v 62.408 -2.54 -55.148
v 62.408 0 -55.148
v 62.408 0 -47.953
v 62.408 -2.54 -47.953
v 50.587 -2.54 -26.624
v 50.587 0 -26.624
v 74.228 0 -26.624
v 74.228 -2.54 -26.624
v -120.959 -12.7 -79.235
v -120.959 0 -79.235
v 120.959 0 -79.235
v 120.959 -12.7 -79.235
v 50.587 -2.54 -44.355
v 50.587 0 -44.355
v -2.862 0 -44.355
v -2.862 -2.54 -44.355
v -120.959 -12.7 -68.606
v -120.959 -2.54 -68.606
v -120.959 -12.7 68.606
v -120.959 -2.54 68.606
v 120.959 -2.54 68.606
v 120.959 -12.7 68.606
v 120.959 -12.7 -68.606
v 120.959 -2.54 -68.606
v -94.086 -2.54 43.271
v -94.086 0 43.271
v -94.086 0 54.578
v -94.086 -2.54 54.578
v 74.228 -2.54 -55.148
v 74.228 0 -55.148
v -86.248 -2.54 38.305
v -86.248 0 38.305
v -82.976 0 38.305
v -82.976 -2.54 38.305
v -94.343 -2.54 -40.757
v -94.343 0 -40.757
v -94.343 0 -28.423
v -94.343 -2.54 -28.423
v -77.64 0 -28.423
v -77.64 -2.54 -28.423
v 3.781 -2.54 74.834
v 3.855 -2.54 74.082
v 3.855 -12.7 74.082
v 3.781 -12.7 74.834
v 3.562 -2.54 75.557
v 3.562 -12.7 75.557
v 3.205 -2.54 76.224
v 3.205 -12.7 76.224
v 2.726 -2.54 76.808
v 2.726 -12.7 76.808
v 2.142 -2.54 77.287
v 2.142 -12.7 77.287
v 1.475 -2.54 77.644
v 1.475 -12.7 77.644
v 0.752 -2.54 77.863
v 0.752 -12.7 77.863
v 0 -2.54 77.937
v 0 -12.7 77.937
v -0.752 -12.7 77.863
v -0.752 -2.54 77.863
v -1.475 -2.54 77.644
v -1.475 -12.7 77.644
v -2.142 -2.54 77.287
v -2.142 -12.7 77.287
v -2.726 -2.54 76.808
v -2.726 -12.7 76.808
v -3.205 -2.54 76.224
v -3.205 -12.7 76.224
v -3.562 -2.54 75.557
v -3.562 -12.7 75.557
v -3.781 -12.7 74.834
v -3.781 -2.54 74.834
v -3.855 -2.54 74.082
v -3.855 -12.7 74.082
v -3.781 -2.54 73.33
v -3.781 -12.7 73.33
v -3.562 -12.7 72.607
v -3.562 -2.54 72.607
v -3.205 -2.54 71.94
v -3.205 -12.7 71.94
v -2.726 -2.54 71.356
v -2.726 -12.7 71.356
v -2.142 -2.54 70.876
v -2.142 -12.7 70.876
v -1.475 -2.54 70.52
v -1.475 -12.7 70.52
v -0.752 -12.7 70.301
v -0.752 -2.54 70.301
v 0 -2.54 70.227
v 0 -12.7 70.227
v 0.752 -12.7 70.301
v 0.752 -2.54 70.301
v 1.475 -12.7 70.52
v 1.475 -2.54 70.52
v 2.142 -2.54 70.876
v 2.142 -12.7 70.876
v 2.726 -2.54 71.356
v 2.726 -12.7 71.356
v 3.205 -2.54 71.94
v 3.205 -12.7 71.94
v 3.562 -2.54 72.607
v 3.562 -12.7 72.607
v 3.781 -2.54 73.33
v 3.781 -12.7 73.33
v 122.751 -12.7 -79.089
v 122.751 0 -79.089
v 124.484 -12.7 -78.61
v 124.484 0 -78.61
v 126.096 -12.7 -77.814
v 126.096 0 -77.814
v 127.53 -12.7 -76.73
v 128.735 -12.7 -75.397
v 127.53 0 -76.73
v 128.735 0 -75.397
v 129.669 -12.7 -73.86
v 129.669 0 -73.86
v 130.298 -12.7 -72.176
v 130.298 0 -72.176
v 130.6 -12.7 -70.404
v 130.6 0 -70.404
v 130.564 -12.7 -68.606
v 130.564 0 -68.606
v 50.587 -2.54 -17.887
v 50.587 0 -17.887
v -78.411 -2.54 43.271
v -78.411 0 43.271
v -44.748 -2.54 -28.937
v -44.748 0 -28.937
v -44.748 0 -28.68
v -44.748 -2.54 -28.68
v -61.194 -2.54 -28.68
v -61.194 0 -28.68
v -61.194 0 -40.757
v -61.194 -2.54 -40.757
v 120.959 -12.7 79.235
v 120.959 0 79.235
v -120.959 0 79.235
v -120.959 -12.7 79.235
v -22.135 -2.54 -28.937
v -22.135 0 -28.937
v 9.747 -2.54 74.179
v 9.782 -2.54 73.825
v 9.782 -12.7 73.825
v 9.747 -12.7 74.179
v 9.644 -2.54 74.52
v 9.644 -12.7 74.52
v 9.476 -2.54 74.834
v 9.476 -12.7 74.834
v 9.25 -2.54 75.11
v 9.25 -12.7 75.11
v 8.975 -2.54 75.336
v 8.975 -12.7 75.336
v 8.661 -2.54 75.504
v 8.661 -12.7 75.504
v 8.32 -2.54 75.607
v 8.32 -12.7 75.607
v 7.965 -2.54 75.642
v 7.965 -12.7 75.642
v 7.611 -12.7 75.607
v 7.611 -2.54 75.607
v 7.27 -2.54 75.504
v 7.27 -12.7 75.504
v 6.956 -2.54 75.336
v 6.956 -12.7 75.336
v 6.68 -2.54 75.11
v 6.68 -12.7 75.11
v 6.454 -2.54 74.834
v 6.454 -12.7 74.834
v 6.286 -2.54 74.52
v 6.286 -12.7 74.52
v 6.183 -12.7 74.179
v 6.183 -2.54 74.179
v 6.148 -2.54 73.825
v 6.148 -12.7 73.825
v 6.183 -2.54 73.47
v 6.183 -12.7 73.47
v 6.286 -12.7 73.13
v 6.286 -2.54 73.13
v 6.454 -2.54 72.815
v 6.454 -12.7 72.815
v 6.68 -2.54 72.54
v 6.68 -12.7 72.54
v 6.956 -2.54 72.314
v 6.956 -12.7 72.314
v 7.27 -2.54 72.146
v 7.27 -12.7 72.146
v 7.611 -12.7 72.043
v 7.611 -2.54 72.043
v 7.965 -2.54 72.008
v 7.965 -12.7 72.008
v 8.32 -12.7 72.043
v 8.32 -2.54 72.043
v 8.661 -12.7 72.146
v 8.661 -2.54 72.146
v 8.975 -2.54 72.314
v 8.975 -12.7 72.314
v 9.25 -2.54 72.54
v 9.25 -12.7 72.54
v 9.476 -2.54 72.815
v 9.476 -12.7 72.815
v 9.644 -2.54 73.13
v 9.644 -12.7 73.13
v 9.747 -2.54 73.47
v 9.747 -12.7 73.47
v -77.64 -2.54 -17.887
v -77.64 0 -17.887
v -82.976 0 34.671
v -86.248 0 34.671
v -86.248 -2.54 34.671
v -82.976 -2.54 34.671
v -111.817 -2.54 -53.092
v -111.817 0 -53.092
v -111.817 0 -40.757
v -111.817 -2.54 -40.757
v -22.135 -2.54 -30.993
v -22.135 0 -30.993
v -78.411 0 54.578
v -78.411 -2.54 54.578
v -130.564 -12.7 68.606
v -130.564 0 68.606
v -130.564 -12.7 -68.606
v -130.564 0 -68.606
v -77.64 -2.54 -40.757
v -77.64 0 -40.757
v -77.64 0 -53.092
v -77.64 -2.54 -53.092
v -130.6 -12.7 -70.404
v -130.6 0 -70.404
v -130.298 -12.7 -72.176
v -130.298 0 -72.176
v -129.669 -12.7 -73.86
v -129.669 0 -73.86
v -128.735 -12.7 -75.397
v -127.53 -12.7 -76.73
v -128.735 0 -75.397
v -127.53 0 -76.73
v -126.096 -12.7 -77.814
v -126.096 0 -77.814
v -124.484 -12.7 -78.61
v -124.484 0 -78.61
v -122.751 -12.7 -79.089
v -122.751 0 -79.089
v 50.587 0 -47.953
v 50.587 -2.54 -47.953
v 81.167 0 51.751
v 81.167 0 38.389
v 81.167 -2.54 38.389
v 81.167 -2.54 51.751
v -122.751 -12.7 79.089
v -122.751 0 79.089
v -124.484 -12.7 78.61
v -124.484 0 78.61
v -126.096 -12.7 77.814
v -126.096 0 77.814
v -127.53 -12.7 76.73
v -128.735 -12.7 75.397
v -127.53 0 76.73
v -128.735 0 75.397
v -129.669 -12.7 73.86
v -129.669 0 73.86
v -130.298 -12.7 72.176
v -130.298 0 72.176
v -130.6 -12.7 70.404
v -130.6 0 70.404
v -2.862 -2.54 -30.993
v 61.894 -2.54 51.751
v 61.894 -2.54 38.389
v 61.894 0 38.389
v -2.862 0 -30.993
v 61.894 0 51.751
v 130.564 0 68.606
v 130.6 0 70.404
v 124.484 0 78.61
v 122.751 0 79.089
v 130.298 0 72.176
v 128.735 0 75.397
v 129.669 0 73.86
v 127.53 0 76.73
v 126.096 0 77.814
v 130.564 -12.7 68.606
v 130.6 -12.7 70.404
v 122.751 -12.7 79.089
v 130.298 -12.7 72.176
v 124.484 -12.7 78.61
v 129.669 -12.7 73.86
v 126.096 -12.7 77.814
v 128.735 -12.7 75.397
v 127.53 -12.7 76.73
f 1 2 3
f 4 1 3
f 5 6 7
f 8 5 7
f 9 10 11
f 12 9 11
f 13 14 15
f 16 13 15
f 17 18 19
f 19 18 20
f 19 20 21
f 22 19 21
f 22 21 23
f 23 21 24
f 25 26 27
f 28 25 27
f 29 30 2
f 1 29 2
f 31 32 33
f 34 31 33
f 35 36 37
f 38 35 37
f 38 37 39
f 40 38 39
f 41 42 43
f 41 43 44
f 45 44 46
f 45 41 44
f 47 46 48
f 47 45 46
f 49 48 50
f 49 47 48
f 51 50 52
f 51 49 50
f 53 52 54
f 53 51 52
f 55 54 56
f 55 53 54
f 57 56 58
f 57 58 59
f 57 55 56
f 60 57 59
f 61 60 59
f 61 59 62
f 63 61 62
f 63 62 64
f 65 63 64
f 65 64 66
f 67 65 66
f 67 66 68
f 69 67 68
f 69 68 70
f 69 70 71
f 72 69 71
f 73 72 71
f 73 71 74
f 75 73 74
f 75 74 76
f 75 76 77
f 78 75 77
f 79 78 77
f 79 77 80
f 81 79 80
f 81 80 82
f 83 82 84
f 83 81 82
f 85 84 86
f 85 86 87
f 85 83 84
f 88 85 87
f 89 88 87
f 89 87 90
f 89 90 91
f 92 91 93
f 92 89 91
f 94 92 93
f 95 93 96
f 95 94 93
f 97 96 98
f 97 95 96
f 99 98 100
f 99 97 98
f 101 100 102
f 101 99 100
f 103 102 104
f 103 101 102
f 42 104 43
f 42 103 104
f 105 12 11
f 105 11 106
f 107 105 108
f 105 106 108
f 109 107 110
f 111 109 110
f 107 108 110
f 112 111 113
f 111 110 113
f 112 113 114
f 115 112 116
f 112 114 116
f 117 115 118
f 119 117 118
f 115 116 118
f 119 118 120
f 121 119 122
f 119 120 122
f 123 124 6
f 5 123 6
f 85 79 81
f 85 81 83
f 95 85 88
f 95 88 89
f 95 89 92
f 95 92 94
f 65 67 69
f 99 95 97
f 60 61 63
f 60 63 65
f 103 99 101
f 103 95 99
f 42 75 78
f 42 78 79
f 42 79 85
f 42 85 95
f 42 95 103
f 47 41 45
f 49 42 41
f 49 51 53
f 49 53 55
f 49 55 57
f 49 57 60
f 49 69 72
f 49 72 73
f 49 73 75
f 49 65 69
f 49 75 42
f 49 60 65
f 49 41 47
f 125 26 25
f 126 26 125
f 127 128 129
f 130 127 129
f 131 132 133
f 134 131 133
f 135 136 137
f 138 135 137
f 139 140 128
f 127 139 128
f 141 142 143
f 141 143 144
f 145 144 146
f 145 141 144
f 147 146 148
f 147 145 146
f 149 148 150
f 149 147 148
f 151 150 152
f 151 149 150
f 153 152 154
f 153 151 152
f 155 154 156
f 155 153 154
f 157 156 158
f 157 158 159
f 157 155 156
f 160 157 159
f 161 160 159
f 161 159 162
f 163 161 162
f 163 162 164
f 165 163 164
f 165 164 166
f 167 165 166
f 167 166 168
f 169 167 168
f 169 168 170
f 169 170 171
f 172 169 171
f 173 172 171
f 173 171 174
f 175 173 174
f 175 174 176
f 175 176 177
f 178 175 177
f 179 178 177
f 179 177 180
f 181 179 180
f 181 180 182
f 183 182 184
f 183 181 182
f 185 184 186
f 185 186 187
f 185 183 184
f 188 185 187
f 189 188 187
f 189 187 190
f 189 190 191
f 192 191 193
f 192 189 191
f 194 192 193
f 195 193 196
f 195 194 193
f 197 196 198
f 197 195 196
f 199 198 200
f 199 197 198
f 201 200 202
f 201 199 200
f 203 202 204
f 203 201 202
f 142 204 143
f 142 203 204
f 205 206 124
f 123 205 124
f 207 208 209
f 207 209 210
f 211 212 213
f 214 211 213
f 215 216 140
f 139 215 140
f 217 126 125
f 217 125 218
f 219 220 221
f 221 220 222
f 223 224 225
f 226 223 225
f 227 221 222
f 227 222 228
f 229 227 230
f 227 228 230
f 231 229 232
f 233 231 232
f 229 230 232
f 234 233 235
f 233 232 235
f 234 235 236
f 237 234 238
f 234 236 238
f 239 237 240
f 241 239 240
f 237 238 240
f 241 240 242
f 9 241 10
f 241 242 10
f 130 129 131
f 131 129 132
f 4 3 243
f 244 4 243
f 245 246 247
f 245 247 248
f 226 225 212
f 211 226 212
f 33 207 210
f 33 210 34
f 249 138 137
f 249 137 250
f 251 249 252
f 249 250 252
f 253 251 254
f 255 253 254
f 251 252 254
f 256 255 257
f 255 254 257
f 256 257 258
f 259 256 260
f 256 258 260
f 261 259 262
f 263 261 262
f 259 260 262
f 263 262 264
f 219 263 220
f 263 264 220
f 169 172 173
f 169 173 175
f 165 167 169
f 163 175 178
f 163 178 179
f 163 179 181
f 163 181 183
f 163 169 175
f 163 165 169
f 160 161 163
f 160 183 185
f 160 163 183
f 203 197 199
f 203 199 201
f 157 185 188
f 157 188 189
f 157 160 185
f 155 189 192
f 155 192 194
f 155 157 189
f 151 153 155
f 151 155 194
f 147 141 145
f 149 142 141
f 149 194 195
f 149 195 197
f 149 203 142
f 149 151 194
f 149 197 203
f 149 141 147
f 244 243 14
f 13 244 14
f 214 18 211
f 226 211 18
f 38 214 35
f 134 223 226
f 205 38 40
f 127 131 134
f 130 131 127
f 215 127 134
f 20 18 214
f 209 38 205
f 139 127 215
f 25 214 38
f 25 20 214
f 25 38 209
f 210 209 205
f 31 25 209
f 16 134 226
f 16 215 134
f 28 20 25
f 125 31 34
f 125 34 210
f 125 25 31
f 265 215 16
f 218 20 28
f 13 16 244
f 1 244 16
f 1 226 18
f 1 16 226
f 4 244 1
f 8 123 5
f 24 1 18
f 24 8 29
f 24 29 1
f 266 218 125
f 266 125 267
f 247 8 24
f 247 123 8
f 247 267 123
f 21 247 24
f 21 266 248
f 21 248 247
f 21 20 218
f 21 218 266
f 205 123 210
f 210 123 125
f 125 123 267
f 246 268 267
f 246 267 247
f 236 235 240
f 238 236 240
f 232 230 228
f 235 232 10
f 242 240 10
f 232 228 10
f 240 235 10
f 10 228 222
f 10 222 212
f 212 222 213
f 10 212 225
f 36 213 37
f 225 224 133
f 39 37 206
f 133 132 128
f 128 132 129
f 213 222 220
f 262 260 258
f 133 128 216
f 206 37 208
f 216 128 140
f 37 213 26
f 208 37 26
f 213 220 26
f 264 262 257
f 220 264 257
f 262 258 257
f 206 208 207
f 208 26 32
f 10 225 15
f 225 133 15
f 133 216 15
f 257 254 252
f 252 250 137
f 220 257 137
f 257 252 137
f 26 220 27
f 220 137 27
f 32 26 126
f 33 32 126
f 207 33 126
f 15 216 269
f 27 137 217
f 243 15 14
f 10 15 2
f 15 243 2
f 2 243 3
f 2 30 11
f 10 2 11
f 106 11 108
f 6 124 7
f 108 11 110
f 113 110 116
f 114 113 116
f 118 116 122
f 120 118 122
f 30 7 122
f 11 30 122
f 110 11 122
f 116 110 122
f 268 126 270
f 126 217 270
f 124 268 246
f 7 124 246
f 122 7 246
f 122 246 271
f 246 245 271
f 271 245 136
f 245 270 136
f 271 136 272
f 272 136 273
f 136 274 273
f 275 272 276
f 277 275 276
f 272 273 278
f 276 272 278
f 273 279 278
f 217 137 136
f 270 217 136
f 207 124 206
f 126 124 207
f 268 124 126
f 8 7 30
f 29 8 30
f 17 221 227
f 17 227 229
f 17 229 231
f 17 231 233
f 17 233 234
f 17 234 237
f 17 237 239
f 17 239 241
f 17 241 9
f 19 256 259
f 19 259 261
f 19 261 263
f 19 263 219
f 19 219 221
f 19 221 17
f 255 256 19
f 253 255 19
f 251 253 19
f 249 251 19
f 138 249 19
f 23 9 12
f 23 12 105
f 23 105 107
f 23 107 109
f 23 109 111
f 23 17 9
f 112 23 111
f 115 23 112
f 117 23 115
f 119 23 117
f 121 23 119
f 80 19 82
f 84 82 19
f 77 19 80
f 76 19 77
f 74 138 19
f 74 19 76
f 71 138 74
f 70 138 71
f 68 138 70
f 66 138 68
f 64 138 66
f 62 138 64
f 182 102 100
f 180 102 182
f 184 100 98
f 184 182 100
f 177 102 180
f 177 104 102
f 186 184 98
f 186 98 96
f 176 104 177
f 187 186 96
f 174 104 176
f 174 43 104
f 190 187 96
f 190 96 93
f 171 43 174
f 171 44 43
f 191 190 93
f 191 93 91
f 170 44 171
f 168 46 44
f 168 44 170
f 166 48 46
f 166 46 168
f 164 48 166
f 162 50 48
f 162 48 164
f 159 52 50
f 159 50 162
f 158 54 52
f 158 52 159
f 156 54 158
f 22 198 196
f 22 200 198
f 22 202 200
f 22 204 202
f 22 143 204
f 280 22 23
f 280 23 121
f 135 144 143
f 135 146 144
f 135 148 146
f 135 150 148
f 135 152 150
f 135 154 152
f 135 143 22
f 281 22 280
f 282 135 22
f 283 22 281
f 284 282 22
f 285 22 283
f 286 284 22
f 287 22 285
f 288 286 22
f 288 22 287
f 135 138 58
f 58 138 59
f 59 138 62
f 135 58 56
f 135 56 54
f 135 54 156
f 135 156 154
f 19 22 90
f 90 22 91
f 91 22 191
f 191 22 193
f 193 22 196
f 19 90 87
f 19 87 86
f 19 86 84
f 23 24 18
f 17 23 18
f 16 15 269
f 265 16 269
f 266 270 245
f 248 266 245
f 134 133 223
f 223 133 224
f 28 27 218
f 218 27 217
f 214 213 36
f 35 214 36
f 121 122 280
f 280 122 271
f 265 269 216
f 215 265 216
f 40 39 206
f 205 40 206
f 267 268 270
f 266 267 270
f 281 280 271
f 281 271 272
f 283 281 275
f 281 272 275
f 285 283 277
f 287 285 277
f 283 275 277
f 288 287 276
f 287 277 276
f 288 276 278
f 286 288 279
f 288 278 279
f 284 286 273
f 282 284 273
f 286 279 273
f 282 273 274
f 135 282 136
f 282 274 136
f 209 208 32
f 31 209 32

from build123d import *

# Parameters (mm, degrees)
F0_R     = 3.8551712717
F0_R_2   = 1.8170405965
F1_DEPTH = 12.7
F0_W     = 120.9587007761
F0_H     = 68.6061382294
F0_W_2   = 3.2722949982
F0_H_2   = 3.6340802908
F0_W_3   = 15.6750679016
F0_H_3   = 11.3066062331
F0_W_4   = 19.2726254463
F0_H_4   = 13.362351805
F2_DEPTH = 2.54


with BuildPart() as f1:
    # F0 (on Front) → F1 (new body)
    with BuildSketch(Plane.XZ):
        with BuildLine():
            Line((-130.564019084, 68.6061382294), (-120.9587007761, 68.6061382294))
            Line((-120.9587007761, 68.6061382294), (-120.9587007761, 79.2347192764))
            ThreePointArc((-120.9587007761, 79.2347192764), (-128.1642263421, 76.0919600831), (-130.564019084, 68.6061382294))
        make_face()
        with BuildLine():
            Line((120.9587007761, 79.2347192764), (120.9587007761, 68.6061382294))
            Line((120.9587007761, 68.6061382294), (130.564019084, 68.6061382294))
            ThreePointArc((130.564019084, 68.6061382294), (128.1642263421, 76.0919600831), (120.9587007761, 79.2347192764))
        make_face()
        with BuildLine():
            Line((-120.9587007761, -79.2347192764), (-120.9587007761, -68.6061382294))
            Line((-120.9587007761, -68.6061382294), (-130.564019084, -68.6061382294))
            ThreePointArc((-130.564019084, -68.6061382294), (-128.1642263421, -76.0919600831), (-120.9587007761, -79.2347192764))
        make_face()
        with BuildLine():
            Line((130.564019084, -68.6061382294), (120.9587007761, -68.6061382294))
            Line((120.9587007761, -68.6061382294), (120.9587007761, -79.2347192764))
            ThreePointArc((120.9587007761, -79.2347192764), (128.1642263421, -76.0919600831), (130.564019084, -68.6061382294))
        make_face()
        Polygon((-120.9587007761, -68.6061382294), (-120.9587007761, 0), (-120.9587007761, 68.6061382294), (-130.564019084, 68.6061382294), (-130.564019084, -68.6061382294), align=None)
        Polygon((120.9587007761, 68.6061382294), (120.9587007761, 0), (120.9587007761, -68.6061382294), (130.564019084, -68.6061382294), (130.564019084, 68.6061382294), align=None)
        Polygon((0, -68.6061382294), (-120.9587007761, -68.6061382294), (-120.9587007761, -79.2347192764), (120.9587007761, -79.2347192764), (120.9587007761, -68.6061382294), align=None)
        Polygon((-120.9587007761, 68.6061382294), (0, 68.6061382294), (120.9587007761, 68.6061382294), (120.9587007761, 79.2347192764), (-120.9587007761, 79.2347192764), align=None)
        with Locations((0, 74.081890285)):
            Circle(F0_R, mode=Mode.SUBTRACT)
        with Locations((7.9652052373, 73.8249197602)):
            Circle(F0_R_2, mode=Mode.SUBTRACT)
    extrude(amount=F1_DEPTH)

    # F0 (on Front) → F2 (join)
    with BuildSketch(Plane.XZ):
        with Locations((-60.4793503881, 34.3030691147)):
            Rectangle(F0_W, F0_H)
        with Locations((-84.6121534705, 36.4879220724)):
            Rectangle(F0_W_2, F0_H_2, mode=Mode.SUBTRACT)
        with Locations((-86.2483009696, 48.9245094359)):
            Rectangle(F0_W_3, F0_H_3, mode=Mode.SUBTRACT)
        with Locations((60.4793503881, 34.3030691147)):
            Rectangle(F0_W, F0_H)
        with Locations((71.5301930904, 45.069983229)):
            Rectangle(F0_W_4, F0_H_4, mode=Mode.SUBTRACT)
        Polygon((120.9587007761, 0), (0, 0), (0, -17.8872328252), (23.6056204885, -17.8872328252), (50.5872815847, -17.8872328252), (50.5872815847, -26.6241524369), (74.228361249, -26.6241524369), (74.228361249, -47.9525141418), (74.228361249, -55.1476255059), (62.4078214169, -55.1476255059), (62.4078214169, -47.9525141418), (50.5872815847, -47.9525141418), (50.5872815847, -44.3549603224), (20.5219965428, -44.3549603224), (0, -44.3549603224), (0, -68.6061382294), (120.9587007761, -68.6061382294), align=None)
        Polygon((0, -17.8872328252), (0, 0), (-120.9587007761, 0), (-120.9587007761, -68.6061382294), (0, -68.6061382294), (0, -44.3549603224), (-2.8621072415, -44.3549603224), (-2.8621072415, -30.9926122427), (-22.1347268671, -30.9926122427), (-22.1347268671, -28.9368666708), (-44.7479300201, -28.9368666708), (-44.7479300201, -28.6798980087), (-61.1938983202, -28.6798980087), (-61.1938983202, -40.757406503), (-77.639862895, -40.757406503), (-77.639862895, -53.0918799341), (-94.3427979946, -53.0918799341), (-111.816637218, -53.0918799341), (-111.816637218, -40.757406503), (-94.3427979946, -40.757406503), (-94.3427979946, -28.4229293466), (-77.639862895, -28.4229293466), (-77.639862895, -17.8872328252), (-61.1938983202, -17.8872328252), (-44.7479300201, -17.8872328252), (-22.1347268671, -17.8872328252), (-2.8621072415, -17.8872328252), align=None)
        with Locations((0, 74.081890285)):
            Circle(F0_R)
        with Locations((7.9652052373, 73.8249197602)):
            Circle(F0_R_2)
    extrude(amount=F2_DEPTH)


solid = f1.part
